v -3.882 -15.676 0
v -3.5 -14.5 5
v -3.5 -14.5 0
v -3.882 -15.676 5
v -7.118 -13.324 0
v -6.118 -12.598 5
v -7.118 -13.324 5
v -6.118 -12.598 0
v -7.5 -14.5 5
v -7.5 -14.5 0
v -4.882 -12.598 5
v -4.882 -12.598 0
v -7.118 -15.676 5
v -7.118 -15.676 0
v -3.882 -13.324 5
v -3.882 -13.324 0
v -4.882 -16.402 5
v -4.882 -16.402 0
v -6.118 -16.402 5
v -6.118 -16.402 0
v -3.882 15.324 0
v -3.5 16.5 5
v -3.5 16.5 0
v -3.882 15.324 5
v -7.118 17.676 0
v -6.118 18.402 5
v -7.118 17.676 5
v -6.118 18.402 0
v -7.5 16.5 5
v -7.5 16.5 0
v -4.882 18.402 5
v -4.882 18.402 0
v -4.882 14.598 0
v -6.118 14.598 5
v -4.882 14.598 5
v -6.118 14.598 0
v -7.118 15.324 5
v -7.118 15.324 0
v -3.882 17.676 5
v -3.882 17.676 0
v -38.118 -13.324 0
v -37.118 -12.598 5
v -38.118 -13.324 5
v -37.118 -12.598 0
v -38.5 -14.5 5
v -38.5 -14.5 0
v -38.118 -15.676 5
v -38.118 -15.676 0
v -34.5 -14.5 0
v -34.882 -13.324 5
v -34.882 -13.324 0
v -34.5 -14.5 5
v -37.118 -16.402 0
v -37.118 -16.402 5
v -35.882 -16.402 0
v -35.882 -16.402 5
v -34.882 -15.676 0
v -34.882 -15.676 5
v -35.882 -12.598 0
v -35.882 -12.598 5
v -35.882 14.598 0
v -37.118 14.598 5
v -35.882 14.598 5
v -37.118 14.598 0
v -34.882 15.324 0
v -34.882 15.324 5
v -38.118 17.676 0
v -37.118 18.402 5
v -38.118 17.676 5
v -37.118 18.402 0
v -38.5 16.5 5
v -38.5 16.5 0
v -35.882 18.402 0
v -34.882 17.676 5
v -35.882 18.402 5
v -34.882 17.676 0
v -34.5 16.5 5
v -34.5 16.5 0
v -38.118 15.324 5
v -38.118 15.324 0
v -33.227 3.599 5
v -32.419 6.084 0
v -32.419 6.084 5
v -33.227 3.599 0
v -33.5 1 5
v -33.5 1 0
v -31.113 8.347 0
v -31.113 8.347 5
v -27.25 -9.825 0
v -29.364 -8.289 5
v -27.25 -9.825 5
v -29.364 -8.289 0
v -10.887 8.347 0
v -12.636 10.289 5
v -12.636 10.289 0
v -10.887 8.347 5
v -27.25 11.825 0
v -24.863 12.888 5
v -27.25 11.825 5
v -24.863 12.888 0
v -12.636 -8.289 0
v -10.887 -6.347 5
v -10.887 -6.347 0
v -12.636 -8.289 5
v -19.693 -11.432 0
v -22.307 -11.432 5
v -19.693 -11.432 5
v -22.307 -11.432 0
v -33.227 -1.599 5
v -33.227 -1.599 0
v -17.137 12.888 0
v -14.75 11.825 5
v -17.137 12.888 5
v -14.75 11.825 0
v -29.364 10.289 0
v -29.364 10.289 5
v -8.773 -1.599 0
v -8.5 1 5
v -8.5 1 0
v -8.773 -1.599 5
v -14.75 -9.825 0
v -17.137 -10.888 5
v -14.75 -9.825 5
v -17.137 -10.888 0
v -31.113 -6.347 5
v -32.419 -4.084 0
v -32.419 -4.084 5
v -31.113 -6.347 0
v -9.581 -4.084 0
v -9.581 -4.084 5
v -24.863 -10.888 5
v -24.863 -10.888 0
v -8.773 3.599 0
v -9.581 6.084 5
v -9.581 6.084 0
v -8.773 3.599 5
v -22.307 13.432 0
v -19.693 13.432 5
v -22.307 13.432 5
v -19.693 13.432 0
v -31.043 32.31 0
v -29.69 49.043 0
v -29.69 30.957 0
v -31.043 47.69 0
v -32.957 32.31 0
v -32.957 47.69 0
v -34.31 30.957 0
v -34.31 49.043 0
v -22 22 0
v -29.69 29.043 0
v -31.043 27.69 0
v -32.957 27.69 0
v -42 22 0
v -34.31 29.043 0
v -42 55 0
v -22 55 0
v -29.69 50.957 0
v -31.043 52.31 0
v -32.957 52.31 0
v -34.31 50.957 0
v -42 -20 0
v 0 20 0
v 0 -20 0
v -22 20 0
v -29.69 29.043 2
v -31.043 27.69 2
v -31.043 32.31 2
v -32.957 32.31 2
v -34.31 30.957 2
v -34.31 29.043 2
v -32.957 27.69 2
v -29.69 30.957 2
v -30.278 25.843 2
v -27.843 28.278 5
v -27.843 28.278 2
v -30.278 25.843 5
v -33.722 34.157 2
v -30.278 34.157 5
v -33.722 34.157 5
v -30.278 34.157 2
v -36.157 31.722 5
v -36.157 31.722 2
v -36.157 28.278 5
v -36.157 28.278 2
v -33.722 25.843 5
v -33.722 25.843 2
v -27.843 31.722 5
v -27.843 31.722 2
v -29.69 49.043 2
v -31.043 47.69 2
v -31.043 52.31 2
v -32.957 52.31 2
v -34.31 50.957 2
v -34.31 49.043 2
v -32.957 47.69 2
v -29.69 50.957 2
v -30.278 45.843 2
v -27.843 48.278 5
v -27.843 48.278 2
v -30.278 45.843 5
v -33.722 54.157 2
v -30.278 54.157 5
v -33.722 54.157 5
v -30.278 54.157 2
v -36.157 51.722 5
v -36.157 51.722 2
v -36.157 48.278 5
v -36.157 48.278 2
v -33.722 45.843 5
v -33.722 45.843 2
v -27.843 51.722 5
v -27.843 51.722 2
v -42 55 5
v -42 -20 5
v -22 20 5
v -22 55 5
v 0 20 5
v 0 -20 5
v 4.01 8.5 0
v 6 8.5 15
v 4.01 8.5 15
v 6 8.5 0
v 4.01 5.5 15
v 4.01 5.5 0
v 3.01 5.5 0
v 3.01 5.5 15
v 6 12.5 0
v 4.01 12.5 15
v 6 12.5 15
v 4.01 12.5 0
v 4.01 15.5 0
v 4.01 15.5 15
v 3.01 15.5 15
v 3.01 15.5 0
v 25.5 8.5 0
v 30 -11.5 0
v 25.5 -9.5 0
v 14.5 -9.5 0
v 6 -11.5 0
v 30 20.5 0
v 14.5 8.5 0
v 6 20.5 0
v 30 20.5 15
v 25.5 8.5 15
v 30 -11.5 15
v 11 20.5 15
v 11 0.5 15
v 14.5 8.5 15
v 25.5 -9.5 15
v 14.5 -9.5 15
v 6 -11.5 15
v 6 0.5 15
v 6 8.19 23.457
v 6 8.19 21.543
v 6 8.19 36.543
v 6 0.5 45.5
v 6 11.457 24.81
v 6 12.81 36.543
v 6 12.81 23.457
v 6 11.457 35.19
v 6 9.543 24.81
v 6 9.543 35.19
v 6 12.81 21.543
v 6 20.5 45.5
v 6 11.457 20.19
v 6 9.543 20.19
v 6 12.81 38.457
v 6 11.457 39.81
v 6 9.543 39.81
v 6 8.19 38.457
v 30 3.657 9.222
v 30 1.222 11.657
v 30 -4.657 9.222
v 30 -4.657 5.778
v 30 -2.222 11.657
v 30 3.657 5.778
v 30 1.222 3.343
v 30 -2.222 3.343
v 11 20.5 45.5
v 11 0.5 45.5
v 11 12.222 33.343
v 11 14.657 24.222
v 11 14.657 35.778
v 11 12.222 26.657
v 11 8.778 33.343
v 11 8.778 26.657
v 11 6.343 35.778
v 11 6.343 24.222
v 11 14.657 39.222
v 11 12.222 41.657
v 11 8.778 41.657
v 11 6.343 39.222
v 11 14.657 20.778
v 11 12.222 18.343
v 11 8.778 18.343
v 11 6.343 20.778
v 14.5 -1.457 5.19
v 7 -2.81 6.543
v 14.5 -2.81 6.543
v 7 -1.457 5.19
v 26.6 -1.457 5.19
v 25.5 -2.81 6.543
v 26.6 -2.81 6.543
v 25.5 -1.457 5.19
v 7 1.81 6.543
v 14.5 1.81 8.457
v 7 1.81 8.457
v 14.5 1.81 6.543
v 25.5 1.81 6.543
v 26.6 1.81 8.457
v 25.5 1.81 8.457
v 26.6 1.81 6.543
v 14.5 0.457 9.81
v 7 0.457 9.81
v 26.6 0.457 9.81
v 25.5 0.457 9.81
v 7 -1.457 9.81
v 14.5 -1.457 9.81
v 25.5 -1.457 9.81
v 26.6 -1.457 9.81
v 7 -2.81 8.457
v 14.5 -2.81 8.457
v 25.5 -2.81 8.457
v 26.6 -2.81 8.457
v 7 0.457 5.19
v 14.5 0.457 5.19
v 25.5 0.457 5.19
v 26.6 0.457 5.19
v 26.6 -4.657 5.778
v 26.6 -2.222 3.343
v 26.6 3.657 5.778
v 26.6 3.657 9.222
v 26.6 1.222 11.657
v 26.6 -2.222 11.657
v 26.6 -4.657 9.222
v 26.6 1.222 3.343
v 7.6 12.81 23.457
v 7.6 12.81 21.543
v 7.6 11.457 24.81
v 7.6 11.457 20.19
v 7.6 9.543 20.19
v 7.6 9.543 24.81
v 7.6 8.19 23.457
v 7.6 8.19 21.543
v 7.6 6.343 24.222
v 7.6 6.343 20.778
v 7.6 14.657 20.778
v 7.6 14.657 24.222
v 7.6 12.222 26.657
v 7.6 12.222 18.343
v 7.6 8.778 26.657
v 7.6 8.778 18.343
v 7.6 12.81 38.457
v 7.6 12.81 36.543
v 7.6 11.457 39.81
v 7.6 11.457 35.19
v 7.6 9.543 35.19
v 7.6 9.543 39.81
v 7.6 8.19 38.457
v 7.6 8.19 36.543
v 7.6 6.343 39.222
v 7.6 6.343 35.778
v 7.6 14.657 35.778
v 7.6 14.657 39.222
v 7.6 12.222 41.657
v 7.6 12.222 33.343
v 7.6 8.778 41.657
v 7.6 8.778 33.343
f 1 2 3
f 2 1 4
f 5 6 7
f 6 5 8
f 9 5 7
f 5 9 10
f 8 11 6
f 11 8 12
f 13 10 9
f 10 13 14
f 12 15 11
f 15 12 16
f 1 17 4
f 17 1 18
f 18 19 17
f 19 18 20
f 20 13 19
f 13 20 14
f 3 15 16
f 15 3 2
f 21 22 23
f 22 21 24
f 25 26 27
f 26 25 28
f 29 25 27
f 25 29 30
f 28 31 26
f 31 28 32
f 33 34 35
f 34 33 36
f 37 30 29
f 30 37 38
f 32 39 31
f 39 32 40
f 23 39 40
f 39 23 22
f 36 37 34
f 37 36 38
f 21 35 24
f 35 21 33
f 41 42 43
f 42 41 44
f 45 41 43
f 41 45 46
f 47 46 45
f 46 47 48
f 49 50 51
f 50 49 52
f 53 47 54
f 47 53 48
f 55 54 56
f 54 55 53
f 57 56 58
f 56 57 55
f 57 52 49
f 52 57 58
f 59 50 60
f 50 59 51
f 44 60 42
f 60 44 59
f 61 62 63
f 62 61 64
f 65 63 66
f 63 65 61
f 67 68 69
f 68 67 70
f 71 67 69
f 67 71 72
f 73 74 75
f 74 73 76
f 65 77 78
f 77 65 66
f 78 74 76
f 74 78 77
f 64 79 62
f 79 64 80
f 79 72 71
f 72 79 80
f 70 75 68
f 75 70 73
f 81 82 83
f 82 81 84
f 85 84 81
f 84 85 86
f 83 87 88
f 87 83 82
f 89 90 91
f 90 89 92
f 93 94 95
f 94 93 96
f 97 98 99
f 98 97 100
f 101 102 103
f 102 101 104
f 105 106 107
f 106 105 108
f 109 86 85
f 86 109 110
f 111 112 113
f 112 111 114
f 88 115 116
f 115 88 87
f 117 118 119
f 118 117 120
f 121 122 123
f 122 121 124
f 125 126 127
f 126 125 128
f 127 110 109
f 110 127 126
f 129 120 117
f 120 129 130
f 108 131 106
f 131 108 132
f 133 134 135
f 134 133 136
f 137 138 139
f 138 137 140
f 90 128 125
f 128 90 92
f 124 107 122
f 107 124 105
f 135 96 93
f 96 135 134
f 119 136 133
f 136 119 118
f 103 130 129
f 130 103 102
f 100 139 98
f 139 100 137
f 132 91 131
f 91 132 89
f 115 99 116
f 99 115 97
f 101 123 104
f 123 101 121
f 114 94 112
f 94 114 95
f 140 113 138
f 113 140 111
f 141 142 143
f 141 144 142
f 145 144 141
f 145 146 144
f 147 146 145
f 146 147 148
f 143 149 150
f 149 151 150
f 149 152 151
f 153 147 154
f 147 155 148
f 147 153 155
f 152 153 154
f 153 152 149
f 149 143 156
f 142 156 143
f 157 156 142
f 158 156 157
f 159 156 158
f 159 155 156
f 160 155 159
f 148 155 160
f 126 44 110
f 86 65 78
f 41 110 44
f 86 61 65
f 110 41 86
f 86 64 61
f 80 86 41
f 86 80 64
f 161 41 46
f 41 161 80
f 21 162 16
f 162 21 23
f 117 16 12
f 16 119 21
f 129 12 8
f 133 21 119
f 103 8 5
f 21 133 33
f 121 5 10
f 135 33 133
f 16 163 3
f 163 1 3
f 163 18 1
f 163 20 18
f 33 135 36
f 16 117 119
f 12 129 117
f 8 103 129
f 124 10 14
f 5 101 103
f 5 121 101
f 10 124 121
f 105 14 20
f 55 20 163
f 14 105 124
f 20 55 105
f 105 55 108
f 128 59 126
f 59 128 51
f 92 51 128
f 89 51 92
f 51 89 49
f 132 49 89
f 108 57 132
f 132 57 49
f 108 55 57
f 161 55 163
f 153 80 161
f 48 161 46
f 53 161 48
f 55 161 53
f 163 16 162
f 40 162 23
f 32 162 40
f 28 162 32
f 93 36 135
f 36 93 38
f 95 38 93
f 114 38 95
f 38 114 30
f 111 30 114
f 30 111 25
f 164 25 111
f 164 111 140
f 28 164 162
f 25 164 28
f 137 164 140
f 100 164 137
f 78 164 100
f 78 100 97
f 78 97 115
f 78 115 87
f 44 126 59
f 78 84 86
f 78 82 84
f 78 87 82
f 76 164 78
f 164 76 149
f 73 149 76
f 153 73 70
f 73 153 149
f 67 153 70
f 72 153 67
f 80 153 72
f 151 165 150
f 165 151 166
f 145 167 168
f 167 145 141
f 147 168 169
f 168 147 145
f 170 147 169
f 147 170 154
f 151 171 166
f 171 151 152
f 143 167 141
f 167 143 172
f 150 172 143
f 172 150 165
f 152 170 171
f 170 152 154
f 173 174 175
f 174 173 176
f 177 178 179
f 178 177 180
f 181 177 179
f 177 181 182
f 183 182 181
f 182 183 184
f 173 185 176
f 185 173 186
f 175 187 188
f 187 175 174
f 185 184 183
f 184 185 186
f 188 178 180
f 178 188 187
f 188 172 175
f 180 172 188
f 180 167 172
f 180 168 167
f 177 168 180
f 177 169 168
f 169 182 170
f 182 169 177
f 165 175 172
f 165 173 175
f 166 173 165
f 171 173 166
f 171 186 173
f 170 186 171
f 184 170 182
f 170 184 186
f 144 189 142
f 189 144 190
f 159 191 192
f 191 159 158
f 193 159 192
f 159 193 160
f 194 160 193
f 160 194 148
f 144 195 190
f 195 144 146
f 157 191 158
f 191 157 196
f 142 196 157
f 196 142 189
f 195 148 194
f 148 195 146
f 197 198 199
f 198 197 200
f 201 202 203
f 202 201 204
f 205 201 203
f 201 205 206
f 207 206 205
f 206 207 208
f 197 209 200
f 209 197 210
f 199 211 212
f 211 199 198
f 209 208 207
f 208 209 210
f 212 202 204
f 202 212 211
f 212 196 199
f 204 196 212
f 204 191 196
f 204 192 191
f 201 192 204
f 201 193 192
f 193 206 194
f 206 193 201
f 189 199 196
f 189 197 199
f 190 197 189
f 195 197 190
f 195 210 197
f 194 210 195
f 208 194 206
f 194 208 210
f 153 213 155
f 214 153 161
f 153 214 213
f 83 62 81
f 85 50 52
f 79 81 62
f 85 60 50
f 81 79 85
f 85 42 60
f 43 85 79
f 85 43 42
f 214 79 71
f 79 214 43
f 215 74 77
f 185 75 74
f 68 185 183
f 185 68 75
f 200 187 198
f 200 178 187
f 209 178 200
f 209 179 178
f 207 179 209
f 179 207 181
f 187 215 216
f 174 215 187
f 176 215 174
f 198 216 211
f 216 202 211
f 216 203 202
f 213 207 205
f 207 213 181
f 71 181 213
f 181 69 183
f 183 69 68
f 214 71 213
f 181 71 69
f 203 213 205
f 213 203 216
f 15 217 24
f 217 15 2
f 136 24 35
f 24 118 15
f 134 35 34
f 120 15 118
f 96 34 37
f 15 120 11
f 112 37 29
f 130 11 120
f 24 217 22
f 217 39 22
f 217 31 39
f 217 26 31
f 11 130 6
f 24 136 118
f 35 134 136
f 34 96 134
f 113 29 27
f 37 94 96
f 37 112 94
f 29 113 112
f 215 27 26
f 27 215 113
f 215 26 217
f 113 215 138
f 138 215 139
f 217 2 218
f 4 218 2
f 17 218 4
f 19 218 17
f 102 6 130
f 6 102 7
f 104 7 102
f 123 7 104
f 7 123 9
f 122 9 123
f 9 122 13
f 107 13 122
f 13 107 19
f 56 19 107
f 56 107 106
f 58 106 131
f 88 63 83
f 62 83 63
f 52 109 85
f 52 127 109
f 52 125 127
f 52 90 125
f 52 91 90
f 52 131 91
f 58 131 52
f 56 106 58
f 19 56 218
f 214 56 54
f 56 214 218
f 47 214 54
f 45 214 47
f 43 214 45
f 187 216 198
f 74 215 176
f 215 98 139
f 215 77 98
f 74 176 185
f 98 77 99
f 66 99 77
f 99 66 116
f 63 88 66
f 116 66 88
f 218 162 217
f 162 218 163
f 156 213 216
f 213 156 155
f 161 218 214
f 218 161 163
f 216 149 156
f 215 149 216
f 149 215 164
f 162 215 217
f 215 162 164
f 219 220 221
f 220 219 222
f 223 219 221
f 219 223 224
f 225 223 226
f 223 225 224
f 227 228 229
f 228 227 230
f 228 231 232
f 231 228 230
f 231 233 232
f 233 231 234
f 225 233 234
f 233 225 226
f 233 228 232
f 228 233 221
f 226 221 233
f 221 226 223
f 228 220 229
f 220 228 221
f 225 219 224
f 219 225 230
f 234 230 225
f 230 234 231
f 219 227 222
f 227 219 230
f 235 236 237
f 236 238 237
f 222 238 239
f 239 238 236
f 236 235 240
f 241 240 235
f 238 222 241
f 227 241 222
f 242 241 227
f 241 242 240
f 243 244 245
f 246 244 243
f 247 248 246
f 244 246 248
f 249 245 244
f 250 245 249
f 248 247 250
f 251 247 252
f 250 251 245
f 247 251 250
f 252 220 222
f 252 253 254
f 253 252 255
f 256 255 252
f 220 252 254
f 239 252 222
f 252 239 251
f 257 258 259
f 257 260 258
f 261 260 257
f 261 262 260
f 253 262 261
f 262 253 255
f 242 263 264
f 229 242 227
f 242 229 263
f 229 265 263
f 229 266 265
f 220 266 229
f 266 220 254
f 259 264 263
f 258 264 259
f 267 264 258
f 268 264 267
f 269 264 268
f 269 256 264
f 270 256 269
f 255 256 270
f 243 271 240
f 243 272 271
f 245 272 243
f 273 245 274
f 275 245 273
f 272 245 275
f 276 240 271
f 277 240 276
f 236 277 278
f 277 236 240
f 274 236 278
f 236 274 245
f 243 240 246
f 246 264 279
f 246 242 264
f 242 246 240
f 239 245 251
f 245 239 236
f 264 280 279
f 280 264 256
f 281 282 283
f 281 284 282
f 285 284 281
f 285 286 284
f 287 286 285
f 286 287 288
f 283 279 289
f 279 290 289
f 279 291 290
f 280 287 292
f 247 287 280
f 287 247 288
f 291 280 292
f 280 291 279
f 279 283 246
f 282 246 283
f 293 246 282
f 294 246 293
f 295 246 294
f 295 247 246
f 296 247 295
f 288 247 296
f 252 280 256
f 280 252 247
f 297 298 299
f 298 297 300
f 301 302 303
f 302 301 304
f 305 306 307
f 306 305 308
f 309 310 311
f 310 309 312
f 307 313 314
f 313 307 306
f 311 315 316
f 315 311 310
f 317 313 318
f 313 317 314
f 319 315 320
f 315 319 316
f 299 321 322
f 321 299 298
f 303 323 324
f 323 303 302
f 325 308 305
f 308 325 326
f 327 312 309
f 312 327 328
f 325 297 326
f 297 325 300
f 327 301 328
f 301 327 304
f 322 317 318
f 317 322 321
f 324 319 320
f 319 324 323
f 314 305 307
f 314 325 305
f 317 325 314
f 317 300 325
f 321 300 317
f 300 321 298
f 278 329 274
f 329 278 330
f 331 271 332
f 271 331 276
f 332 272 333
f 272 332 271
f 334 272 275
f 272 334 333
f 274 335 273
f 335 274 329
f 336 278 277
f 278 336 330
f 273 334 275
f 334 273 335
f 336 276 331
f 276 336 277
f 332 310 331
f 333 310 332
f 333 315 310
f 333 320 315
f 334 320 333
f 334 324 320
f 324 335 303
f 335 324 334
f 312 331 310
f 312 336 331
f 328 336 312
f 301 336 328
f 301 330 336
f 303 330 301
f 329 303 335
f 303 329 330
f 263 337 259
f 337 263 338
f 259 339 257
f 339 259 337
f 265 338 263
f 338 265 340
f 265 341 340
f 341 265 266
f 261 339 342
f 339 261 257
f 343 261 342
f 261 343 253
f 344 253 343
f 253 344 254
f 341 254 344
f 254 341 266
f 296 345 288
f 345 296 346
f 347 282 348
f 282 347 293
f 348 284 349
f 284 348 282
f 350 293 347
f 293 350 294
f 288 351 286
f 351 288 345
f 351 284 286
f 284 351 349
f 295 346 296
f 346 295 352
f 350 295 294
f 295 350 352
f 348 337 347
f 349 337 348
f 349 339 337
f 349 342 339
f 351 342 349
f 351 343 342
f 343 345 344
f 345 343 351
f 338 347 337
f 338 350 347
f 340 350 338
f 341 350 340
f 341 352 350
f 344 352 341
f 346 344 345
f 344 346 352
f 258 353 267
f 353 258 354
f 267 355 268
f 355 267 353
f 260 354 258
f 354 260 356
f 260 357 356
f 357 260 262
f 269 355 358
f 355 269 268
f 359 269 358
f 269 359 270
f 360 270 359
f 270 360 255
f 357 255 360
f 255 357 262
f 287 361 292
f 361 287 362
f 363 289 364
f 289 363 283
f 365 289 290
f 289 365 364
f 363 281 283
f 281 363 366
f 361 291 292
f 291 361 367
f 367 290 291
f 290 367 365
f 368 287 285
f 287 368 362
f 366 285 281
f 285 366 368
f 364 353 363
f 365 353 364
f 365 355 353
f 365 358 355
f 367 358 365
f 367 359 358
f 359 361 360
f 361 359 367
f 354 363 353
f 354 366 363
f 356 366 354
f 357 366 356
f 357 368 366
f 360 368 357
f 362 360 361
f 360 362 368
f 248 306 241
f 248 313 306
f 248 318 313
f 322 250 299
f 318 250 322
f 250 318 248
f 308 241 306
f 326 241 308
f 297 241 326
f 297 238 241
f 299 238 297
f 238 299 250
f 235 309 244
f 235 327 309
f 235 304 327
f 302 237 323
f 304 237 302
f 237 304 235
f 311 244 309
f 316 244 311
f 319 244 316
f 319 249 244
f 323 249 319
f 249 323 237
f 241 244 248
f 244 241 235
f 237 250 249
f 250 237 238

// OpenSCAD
// file: extrusions.scad
module Islot5(l=100){
translate([l/2,0,0]){cube([l,5,6.6],center=true);
translate([0,0,1])hull(){
cube([l,5,4.5],center=true);
translate([0,0,-1.5])cube([l,11,1.5],center=true);
}
}
}

module rcorner(r,l){
translate([l/2,0,0])difference(){
cube([l,r*2,r*2],center=true);
for(i=[-1,1])for(j=[-1,1])translate([0,i*r,j*r])rotate([0,90,0])cylinder(r=r,h=l+1,$fn=20,center=true);
}
}


module profilex020(l=100,x=4){
xwidth=x*10;
color("beige")difference(){
translate([0,-xwidth,-10])cube([l,2*xwidth,20]);
if(x>1)for(i=[1:x-1])translate([-.5,-xwidth+i*20,0])rotate([0,90,0])cylinder(r=12.5/2,$fn=20,h=l+1);

for(i=[0:x-1])translate([-.5,-xwidth+10+i*20,0]){
rotate([0,90,0])cylinder(r=4.3/2,$fn=20,h=l+1);
translate([0,0,-6.9])Islot5(l+1);
mirror([0,0,1])translate([0,0,-6.9])Islot5(l+1);
}
for(i=[0,1])mirror([0,i,0])translate([-.5,-xwidth+3.1,0])rotate([-90,0,0])Islot5(l+1);
for(i=[-xwidth,xwidth])for(j=[-10,10])translate([-.5,i,j])rcorner(2,l+1);
}
}

module profile8020(l=100){
echo(str("profile 8020 L:",l,"mm weight:",(l*.00189),"kg"));
profilex020(l=l,x=4);
}
module profile4020(l=100){
echo(str("profile 4020 L:",l,"mm weight:",(l*.00089),"kg"));
profilex020(l=l,x=2);
}
module profile6020(l=100){
echo(str("profile 6020 L:",l,"mm weight:",(l*.00128),"kg"));
profilex020(l=l,x=3);
}
module profile2020(l=100){
echo(str("profile 2020 L:",l,"mm weight:",(l*.00049),"kg"));
profilex020(l=l,x=1);
}


module drylinn80(len=100,pos=0){
echo(str("drylin NS-01-80 L:",len,"mm weight:",(len*.00114+0.1),"kg"));
xpos=max(0,min(pos,len-80));
color("gray")difference(){
translate([0,-40,0])cube([len,80,12]);
for(i=[0:round(len/150)]){
translate([25+150*i,0,-1]){
	translate([0,20,0])cylinder(r=2,$fn=20,h=30);
	translate([0,-20,0])cylinder(r=2,$fn=20,h=30);
	translate([0,20,4.5])cylinder(r=4,$fn=20,h=30);
	translate([0,-20,4.5])cylinder(r=4,$fn=20,h=30);
	
}
}
translate([-.5,-57/2,6.5])cube([len+1,57,6]);
}
color("beige")difference(){union(){
translate([xpos,-56/2,6.1])cube([80,56,3]);
translate([xpos+6,-56/2,5.9])cube([68,56,6.1]);
}for(i=[0,56])for(j=[-22.5,22.5])translate([xpos+12+i,j,0])cylinder(r=2,$fn=20,h=15);
}

}


module drylinn27(len=80,pos=0){
//echo(str("drylin NS-01-80 L:",len,"mm weight:",(len*.00114+0.1),"kg"));
xpos=max(0,min(pos,len-20));
color("gray")difference(){
translate([0,-27/2,0])cube([len,27,9]);
translate([-.5,-27/2-.1,-.1])cube([len+1,2.76,3.3]);
translate([-.5,27/2-2.75,-.1])cube([len+1,2.76,3.3]);
for(i=[0:round(len/150)]){
translate([25+150*i,0,-1]){
	translate([0,20,0])cylinder(r=2,$fn=20,h=30);
	translate([0,-20,0])cylinder(r=2,$fn=20,h=30);
	translate([0,20,4.5])cylinder(r=4,$fn=20,h=30);
	translate([0,-20,4.5])cylinder(r=4,$fn=20,h=30);
	
}
}
translate([-.5,-16/2,6.5])cube([len+1,16,6]);
}
color("beige")difference(){union(){
translate([xpos,-16/2,6.1])cube([34,16,3]);
translate([xpos+2,-16/2+1,6.6])cube([30,14,3]);
for(i=[0,20])translate([xpos+7	+i,0,9])cylinder(r=3.2,$fn=20,h=5.5);
}
for(i=[0,20])translate([xpos+7	+i,0,2])cylinder(r=2,$fn=20,h=15.5);
}
}


drylinn27(80);

module nema17(cutout=true){
difference(){union(){translate([0,0,-48/2])cube([42,42,48],true);
translate([0,0,-1])cylinder(r=11,h=3.5);

translate([0,0,-1])cylinder(r=2.5,h=25,$fn=30);
if(cutout==true){
translate([0,0,-1])cylinder(r=12.5,h=25);
for(i=[-31/2,31/2])for(j=[-31/2,31/2]){
translate([i,j,-1])cylinder(r=2,h=12,$fn=10);
translate([i,j,10])cylinder(r=4,h=31,$fn=10);
}
}
}
if(cutout!=true){for(i=[-31/2,31/2])for(j=[-31/2,31/2]){
translate([i,j,-4])cylinder(r=2,h=11,$fn=10);
}
}
}
}


module hsnema8(cutout=true){
difference(){
union(){
translate([0,0,30.1/2])cube([20,20,30.1],center=true);
translate([0,0,30.0])cylinder(r=7.5,h=1.4);
translate([0,0,-7])cylinder(r=2.5,h=7.1,$fn=30);
translate([0,0,30.0])cylinder(r=2.5,h=7.1,$fn=30);
if(cutout==true){
translate([0,0,30.0])cylinder(r=7.7,h=11.4);
translate([0,0,-10.0])cylinder(r=7.7,h=11.4);
for(i=[-15.7/2,15.7/2])for(j=[-15.7/2,15.7/2])translate([i,j,28.2+1]){
cylinder(r=2.5/2,h=10.1,$fn=10);
translate([0,0,8])cylinder(r=5/2,h=10,$fn=10);
}
}

}
for(i=[-15.7/2,15.7/2])for(j=[-15.7/2,15.7/2])translate([i,j,28.2])if(cutout!=true){
cylinder(r=2.5/2,h=2,$fn=10);
}
if(cutout!=true){
cylinder(r=2.5/2,h=80,center=true,$fn=20);
}
}
}

hsnema8();

module nema14(cutout=true){
difference(){union(){translate([0,0,-36/2])cube([35,35,36],true);
translate([0,0,-1])cylinder(r=11,h=3.5);

translate([0,0,-1])cylinder(r=2.5,h=25,$fn=30);
if(cutout==true){
translate([0,0,-1])cylinder(r=11.5,h=25);
for(i=[-26/2,26/2])for(j=[-26/2,26/2]){
translate([i,j,-1])cylinder(r=2,h=12,$fn=10);
translate([i,j,10])cylinder(r=4,h=31,$fn=10);
}
}
}
if(cutout!=true){for(i=[-26/2,26/2])for(j=[-26/2,26/2]){
translate([i,j,-4])cylinder(r=2,h=11,$fn=10);
}
}
}
}
// main file
use <extrusions.scad>
xpos=0;
ypos=0;

module ymotor(){mirror([0,0,1])difference(){translate([0,-20,0])cube([42,75,5]);
translate([-20,20,-1])cube([42,75,8]);
#translate([21,1,0])nema17(true);
%translate([32,22,-40])rotate([90,0,90])profile8020(160);
for(j=[0,20])translate([32,30+j,2])mirror([0,0,0])rotate([0,0,360/16]){cylinder(r=2.5,h=30,center=true,$fn=8);
cylinder(r=4.5,h=30,$fn=8);
}
}
}
rotate([0,180,0])ymotor();

*translate([21.5,90,6])rotate([0,0,-90])yidler();

module yidler(){
translate([0,2.5,-16])difference(){
union(){translate([0,2,-2])cube([15,32,24],true);
translate([0,-2,5])cube([38,20,5]);
#translate([0,8,11.5])rotate([90,0,0])difference(){cube([15,5,19],true);
translate([0,-19.51,0]){translate([0,18.5,12.5])cube([31,3,21],true);
translate([0,20,15.5])cube([31,3,21],true);
translate([0,18.5,-12.5])cube([31,3,21],true);
translate([0,20,-15.5])cube([31,3,21],true);
translate([0,22.5,0])cube([31,3,21],true);
}
}

}
translate([0,-3,-4])cube([17,18,11],true);
#translate([0,-3,-1])mirror([0,0,1]){rotate([0,0,22.5])cylinder(r=2.5,h=20,center=true,$fn=8);
translate([0,0,11.6])rotate([0,0,22.5])cylinder(r=4.5,h=4,center=true,$fn=8);}

for(i=[15,30])#translate([i,10.5,18])mirror([0,0,1]){translate([0,-2.5,0])rotate([0,0,22.5])cylinder(r=2.5,h=20,center=true,$fn=8);
translate([0,-2.5,11.6])rotate([0,0,22.5])cylinder(r=4.5,h=4,center=true,$fn=8);}
}
}

module yidleranchor(){
translate([6,0,-16])difference(){
cube([30,39,19],true);
translate([7,-3,0])cube([30,39,10],true);
translate([14,-10,0])rotate([0,0,-35])cube([30,49,22],true);
for(i=[0,10])translate([i,23.7,0])rotate([90,0,0]){
translate([0,0,0])rotate([0,0,22.5])cylinder(r=2.5,h=20,center=true,$fn=8);
translate([0,0,7.6])rotate([0,0,22.5])cylinder(r=4.5,h=4,center=true,$fn=8);
}
for(i=[14,-14])translate([-17.4,i-2,-1])rotate([0,90,0]){
translate([0,0,0])rotate([0,0,22.5])cylinder(r=2.5,h=20,center=true,$fn=8);
translate([0,0,7.6])rotate([0,0,22.5])cylinder(r=4.5,h=4,center=true,$fn=8);
}

}

}



translate([0,0,7.5])rotate([0,-90,0])yidler();

*translate([120,0,3])rotate([0,-90,0])yidleranchor();
